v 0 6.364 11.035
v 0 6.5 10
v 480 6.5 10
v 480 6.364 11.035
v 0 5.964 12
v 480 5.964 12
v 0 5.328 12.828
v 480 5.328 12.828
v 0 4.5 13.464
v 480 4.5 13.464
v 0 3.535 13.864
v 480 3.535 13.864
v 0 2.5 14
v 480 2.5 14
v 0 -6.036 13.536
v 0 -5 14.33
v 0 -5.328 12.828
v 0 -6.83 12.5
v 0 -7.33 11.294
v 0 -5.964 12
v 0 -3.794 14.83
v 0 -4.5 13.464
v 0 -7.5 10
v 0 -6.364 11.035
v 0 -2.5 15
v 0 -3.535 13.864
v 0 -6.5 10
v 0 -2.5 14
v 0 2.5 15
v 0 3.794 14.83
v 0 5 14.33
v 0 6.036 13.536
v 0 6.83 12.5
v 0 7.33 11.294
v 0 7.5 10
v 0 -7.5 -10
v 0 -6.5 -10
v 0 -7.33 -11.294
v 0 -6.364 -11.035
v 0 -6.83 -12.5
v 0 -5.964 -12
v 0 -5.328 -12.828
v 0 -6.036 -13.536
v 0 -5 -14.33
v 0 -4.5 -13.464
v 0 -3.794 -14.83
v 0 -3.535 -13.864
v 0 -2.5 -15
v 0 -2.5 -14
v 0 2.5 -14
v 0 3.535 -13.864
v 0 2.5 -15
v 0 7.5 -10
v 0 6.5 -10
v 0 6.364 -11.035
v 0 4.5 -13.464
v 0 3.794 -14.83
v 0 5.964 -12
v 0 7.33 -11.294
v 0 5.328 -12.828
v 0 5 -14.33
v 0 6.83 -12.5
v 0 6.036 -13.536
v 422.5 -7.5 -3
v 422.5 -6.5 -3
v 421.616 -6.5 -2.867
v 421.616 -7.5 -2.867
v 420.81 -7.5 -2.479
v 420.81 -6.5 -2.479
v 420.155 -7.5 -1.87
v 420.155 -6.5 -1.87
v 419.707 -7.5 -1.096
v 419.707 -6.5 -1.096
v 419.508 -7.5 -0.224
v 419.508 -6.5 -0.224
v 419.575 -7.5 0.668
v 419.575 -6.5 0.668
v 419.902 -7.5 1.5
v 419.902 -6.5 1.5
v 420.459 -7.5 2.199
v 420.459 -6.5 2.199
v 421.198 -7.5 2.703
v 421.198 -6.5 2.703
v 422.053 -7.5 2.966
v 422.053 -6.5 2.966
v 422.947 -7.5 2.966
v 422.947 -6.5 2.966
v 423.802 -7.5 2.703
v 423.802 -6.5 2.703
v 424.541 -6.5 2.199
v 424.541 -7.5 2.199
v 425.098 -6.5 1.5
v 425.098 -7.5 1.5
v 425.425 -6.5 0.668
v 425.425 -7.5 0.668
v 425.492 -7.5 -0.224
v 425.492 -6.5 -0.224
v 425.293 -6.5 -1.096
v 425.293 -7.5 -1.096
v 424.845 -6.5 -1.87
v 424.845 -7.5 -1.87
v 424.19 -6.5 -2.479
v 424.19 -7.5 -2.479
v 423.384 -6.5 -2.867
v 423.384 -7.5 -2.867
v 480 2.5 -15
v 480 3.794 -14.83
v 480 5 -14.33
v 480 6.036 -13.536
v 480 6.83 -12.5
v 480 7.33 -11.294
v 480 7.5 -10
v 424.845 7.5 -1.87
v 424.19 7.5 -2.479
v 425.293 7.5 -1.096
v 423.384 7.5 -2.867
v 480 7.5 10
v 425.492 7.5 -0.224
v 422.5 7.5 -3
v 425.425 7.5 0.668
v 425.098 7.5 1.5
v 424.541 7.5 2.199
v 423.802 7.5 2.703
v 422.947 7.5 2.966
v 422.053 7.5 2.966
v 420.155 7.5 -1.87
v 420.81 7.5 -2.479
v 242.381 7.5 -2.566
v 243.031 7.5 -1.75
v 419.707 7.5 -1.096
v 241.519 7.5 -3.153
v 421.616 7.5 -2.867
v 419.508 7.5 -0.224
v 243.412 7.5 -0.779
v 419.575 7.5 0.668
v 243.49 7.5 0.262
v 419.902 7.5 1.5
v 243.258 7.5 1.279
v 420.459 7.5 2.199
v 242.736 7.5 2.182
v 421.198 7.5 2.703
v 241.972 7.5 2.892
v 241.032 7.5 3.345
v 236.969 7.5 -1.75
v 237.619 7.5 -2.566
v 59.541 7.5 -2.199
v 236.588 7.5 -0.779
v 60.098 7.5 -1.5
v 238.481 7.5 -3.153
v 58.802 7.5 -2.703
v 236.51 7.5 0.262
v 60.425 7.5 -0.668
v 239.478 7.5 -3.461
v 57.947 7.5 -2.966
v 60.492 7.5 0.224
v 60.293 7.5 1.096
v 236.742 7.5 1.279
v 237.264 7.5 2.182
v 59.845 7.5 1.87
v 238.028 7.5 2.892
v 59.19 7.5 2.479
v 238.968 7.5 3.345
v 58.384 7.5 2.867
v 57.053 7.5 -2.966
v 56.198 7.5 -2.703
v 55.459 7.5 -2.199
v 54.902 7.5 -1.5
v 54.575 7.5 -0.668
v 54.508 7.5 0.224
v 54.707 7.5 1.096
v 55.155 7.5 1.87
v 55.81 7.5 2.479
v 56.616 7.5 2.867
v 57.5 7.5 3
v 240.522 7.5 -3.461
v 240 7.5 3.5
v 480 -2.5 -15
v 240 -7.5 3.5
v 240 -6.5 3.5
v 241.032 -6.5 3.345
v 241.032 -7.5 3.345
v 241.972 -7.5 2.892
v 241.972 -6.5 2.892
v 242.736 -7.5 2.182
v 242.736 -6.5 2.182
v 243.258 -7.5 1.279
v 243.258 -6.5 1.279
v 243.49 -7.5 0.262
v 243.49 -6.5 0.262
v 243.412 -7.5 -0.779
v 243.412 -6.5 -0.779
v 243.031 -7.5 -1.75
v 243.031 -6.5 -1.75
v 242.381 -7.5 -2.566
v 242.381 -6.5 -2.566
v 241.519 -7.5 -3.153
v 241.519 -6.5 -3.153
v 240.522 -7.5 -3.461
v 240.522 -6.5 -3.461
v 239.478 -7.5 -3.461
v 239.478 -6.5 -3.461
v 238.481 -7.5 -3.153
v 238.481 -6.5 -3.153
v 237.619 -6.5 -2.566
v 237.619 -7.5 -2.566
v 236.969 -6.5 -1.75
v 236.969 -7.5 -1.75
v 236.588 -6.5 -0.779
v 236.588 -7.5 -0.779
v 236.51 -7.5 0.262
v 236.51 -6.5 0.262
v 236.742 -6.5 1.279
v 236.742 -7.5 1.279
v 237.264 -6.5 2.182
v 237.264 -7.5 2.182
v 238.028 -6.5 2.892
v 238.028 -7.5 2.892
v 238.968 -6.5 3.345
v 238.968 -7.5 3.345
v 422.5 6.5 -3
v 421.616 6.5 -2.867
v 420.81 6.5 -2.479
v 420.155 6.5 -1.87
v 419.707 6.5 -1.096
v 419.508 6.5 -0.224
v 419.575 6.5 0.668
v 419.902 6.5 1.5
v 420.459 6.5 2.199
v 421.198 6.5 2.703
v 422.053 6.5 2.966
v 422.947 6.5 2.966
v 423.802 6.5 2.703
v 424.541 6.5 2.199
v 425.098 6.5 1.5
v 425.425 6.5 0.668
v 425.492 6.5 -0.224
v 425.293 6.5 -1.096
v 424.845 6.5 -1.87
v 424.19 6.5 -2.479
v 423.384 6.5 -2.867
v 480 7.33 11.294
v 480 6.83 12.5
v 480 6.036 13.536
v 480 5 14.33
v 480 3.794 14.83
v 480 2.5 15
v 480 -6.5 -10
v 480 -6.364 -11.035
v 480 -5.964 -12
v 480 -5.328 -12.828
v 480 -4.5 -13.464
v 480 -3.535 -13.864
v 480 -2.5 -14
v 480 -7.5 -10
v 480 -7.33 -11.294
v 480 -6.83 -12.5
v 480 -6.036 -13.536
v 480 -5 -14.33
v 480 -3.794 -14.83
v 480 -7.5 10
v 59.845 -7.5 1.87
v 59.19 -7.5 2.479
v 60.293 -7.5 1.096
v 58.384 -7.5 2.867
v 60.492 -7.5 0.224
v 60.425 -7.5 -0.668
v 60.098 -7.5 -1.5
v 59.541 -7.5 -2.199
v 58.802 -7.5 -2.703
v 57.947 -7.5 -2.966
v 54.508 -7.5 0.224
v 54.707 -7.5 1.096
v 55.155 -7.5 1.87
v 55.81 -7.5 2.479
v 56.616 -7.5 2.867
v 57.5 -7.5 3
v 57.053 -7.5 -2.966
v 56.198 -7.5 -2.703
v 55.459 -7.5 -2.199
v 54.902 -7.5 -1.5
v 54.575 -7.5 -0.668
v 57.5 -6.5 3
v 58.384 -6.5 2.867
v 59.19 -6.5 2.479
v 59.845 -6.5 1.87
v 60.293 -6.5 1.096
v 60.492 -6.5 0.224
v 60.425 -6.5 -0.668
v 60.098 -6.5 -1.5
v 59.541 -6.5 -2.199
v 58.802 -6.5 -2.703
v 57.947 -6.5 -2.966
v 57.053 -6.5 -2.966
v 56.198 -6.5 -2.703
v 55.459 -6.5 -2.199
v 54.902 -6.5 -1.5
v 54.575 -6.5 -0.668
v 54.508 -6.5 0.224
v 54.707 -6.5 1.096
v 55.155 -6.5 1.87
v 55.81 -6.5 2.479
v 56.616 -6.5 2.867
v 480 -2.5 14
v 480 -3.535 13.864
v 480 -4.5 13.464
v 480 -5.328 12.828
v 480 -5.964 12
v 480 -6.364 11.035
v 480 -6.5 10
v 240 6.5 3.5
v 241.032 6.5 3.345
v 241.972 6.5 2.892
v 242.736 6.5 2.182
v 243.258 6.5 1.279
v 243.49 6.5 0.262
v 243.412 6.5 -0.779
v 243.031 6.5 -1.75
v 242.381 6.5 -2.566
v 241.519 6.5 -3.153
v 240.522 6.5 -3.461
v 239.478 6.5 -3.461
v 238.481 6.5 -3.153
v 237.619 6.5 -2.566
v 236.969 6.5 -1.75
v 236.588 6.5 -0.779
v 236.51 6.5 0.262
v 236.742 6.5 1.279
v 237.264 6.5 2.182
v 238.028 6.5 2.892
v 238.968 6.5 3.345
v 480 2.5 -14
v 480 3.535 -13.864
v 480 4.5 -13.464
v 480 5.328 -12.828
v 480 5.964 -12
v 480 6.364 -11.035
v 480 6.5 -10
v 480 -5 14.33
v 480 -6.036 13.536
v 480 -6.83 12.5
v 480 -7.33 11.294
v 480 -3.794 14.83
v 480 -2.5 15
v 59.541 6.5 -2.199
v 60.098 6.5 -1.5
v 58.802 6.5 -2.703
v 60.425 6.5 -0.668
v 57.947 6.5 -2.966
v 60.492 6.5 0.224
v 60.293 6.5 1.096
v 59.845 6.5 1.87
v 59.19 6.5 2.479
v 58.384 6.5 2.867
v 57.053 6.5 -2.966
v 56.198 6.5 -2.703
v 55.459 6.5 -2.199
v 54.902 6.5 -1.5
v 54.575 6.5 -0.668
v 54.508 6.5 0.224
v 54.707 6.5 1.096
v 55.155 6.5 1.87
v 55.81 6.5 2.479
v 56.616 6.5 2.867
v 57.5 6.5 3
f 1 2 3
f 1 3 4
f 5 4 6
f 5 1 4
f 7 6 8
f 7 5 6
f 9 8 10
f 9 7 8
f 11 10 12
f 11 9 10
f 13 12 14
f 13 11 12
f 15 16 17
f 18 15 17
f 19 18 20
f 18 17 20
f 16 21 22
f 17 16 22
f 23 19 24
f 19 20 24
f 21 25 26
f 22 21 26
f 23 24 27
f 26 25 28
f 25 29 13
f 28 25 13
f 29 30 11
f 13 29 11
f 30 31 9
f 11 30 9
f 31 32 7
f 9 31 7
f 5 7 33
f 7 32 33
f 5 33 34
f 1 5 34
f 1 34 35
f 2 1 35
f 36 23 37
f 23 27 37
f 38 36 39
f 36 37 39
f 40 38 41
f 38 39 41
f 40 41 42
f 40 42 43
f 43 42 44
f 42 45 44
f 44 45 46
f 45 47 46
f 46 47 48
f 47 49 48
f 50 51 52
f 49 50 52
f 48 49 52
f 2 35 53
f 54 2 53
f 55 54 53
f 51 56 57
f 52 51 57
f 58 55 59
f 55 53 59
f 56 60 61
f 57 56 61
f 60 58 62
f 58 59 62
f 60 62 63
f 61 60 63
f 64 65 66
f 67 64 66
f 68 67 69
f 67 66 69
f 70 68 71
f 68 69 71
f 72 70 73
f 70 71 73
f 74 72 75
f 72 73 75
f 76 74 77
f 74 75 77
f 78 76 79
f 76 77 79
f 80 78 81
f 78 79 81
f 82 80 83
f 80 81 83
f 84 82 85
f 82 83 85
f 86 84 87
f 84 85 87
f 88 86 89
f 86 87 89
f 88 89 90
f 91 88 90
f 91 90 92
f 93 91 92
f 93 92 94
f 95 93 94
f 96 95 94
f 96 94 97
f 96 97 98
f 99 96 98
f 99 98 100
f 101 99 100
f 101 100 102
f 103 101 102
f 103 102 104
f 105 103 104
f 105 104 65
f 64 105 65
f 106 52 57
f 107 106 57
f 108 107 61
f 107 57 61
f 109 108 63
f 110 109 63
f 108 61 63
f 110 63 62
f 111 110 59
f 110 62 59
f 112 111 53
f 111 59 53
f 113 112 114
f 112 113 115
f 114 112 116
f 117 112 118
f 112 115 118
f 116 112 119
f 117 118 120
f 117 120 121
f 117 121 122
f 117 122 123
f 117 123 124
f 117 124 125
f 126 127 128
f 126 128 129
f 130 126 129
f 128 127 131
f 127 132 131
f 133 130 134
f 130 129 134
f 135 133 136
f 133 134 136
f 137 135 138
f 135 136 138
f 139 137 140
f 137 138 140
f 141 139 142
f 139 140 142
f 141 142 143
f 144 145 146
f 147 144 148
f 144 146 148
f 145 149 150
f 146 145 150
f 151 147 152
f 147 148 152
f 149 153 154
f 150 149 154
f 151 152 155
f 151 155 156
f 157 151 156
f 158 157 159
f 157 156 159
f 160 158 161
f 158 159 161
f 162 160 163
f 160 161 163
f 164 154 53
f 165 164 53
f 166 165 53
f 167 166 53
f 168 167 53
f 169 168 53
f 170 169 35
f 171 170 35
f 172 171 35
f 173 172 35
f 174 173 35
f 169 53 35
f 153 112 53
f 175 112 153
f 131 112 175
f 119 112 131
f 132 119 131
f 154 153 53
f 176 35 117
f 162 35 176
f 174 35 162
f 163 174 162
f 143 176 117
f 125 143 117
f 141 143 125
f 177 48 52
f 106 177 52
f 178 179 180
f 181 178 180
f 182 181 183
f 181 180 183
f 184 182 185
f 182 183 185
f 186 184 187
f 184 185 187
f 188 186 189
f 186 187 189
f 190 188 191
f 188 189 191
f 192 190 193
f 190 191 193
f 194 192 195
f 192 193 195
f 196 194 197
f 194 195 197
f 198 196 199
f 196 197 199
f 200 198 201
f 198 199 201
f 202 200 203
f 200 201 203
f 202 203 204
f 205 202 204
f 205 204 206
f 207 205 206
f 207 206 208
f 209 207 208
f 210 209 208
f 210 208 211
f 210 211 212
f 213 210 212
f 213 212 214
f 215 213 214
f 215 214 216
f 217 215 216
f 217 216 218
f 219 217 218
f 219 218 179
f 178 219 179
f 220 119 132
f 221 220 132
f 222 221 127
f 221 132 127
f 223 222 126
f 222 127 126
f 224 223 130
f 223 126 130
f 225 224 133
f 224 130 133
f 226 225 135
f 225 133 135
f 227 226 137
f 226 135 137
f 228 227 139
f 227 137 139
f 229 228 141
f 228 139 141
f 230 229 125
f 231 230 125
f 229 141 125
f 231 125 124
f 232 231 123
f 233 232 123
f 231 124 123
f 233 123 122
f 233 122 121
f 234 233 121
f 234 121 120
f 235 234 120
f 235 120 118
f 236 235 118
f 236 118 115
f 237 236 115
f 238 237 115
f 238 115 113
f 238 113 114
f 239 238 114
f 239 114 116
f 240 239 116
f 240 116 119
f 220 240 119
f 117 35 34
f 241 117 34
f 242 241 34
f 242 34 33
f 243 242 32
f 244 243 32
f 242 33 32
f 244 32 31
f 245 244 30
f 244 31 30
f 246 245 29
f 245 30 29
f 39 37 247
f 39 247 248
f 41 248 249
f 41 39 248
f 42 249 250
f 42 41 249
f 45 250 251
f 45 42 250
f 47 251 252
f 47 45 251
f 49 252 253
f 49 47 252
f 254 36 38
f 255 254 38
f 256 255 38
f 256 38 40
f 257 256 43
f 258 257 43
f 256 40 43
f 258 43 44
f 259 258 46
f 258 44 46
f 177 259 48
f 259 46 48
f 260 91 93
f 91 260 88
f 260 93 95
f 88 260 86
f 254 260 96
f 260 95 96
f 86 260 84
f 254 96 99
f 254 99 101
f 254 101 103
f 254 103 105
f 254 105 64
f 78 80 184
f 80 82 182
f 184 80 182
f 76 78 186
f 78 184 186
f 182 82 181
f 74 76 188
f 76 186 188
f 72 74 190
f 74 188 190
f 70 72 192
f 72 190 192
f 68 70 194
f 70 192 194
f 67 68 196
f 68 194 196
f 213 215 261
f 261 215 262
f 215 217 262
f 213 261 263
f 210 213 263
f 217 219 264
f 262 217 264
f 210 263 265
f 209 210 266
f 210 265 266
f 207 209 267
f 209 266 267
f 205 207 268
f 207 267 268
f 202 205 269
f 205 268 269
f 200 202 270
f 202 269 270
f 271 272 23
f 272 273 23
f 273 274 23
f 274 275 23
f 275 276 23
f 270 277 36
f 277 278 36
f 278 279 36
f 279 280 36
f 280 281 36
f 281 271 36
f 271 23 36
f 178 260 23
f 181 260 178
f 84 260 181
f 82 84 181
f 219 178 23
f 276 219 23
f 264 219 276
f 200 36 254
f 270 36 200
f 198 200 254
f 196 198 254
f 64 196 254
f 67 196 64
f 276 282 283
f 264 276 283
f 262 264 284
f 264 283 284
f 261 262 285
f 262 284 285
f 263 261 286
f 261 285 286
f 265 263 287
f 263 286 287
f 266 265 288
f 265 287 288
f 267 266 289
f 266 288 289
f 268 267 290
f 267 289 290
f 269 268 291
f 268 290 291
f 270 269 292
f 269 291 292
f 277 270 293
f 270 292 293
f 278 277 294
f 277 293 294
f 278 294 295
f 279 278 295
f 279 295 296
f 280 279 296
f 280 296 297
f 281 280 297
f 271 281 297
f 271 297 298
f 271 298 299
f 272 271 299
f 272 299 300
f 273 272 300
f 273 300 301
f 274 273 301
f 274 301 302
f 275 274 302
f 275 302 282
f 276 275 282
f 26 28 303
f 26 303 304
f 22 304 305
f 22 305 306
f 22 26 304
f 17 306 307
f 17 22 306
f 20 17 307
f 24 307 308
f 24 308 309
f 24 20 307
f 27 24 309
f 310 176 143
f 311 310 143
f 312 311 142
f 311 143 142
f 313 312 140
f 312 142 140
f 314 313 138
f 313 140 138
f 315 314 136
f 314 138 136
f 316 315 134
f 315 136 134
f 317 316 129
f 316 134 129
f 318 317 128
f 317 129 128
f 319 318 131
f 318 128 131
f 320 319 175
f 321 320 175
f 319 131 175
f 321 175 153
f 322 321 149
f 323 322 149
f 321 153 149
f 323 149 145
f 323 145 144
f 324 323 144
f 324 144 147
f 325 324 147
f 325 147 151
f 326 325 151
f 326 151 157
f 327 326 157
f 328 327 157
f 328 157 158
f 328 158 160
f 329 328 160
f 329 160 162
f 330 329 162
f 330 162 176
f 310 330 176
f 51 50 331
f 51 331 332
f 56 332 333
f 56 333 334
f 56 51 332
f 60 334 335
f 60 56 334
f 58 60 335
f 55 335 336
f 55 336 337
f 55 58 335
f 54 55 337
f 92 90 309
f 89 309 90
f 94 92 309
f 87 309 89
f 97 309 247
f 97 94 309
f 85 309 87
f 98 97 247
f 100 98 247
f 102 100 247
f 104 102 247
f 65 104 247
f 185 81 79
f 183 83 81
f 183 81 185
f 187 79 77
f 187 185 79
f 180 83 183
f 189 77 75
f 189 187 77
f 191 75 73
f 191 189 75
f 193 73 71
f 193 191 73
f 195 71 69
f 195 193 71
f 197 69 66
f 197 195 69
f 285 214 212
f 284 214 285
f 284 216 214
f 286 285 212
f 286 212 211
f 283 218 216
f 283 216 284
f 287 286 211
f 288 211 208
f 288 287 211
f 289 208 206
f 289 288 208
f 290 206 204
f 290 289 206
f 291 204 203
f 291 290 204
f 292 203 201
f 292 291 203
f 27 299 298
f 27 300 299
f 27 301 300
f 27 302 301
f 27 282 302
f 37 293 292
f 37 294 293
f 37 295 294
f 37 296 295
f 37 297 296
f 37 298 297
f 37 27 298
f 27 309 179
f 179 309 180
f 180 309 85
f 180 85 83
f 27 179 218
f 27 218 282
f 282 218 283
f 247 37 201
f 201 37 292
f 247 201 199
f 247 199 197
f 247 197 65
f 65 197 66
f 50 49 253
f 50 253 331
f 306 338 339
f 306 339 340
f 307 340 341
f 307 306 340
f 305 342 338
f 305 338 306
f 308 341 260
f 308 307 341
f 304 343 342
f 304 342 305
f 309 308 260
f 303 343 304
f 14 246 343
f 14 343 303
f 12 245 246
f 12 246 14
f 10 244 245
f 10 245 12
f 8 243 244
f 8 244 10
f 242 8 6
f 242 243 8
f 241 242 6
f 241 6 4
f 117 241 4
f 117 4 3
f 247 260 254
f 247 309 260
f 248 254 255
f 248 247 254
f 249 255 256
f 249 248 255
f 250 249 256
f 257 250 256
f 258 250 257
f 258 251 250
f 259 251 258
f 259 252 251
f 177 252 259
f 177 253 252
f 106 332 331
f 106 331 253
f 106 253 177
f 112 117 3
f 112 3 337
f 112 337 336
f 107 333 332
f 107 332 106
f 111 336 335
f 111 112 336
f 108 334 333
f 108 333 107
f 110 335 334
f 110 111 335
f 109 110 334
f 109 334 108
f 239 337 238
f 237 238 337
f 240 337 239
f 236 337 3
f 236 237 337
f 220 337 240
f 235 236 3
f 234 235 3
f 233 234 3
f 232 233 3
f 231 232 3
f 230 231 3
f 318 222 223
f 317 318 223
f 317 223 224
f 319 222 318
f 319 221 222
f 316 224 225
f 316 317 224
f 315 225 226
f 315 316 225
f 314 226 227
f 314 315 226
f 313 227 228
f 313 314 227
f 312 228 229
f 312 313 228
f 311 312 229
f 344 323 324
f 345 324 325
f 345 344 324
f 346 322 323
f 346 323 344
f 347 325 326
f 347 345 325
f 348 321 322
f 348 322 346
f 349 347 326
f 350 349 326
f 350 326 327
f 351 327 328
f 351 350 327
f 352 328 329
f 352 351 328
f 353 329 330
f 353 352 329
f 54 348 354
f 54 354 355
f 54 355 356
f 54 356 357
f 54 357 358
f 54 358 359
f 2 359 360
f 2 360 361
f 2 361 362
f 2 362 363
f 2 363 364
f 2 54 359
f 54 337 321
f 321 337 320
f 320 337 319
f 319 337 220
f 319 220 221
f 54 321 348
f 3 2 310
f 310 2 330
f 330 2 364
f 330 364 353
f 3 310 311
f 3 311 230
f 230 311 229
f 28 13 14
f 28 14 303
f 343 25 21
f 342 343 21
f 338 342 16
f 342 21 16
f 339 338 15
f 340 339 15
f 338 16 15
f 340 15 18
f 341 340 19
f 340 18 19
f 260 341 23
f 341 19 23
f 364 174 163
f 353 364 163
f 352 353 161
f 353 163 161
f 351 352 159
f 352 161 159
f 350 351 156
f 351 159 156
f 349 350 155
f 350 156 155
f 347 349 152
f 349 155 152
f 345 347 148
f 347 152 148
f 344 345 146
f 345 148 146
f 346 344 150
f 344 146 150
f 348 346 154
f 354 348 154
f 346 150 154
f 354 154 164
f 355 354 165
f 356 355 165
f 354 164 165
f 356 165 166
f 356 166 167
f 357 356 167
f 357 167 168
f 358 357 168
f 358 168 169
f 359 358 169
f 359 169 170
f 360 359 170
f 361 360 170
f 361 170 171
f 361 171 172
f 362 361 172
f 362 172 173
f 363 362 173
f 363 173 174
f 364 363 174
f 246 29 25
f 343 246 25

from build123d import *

# Parameters (mm, degrees)
EXTRUDE_1_DEPTH     = 480
SKETCH_2_R          = 3.5
SKETCH_2_R_2        = 3
CUT_EXTRUDE_1_DEPTH = 481.468521341


with BuildPart() as part:
    # Эскиз1 → Вытянуть-Тонкостенный1 (new body)
    with BuildSketch(Plane(origin=(0, 0, 0), x_dir=(0, 0, -1), z_dir=(1, 0, 0))):
        with BuildLine():
            Line((10, 7.5), (-10, 7.5))
            ThreePointArc((-10, 7.5), (-13.535533906, 6.035533906), (-15, 2.5))
            Line((-15, 2.5), (-15, -2.5))
            ThreePointArc((-15, -2.5), (-13.535533906, -6.035533906), (-10, -7.5))
            Line((-10, -7.5), (10, -7.5))
            ThreePointArc((10, -7.5), (13.535533906, -6.035533906), (15, -2.5))
            Line((15, -2.5), (15, 2.5))
            ThreePointArc((15, 2.5), (13.535533906, 6.035533906), (10, 7.5))
        make_face()
        with BuildLine():
            Line((10, 6.5), (-10, 6.5))
            ThreePointArc((-10, 6.5), (-12.828427125, 5.328427125), (-14, 2.5))
            Line((-14, 2.5), (-14, -2.5))
            ThreePointArc((-14, -2.5), (-12.828427125, -5.328427125), (-10, -6.5))
            Line((-10, -6.5), (10, -6.5))
            ThreePointArc((10, -6.5), (12.828427125, -5.328427125), (14, -2.5))
            Line((14, -2.5), (14, 2.5))
            ThreePointArc((14, 2.5), (12.828427125, 5.328427125), (10, 6.5))
        make_face(mode=Mode.SUBTRACT)
    extrude(amount=EXTRUDE_1_DEPTH)

    # Эскиз2 → Вырез-Вытянуть1 (cut, through all)
    with BuildSketch(Plane(origin=(0, 7.5, 0), x_dir=(1, 0, 0), z_dir=(0, 1, 0))):
        with Locations(Location((240, 0, 0), (0, 0, 270))):
            Circle(SKETCH_2_R)
        with Locations(Location((57.5, 0, 0), (0, 0, 270))):
            Circle(SKETCH_2_R_2)
        with Locations(Location((422.5, 0, 0), (0, 0, 90))):
            Circle(SKETCH_2_R_2)
    extrude(amount=-CUT_EXTRUDE_1_DEPTH, mode=Mode.SUBTRACT)


solid = part.part
